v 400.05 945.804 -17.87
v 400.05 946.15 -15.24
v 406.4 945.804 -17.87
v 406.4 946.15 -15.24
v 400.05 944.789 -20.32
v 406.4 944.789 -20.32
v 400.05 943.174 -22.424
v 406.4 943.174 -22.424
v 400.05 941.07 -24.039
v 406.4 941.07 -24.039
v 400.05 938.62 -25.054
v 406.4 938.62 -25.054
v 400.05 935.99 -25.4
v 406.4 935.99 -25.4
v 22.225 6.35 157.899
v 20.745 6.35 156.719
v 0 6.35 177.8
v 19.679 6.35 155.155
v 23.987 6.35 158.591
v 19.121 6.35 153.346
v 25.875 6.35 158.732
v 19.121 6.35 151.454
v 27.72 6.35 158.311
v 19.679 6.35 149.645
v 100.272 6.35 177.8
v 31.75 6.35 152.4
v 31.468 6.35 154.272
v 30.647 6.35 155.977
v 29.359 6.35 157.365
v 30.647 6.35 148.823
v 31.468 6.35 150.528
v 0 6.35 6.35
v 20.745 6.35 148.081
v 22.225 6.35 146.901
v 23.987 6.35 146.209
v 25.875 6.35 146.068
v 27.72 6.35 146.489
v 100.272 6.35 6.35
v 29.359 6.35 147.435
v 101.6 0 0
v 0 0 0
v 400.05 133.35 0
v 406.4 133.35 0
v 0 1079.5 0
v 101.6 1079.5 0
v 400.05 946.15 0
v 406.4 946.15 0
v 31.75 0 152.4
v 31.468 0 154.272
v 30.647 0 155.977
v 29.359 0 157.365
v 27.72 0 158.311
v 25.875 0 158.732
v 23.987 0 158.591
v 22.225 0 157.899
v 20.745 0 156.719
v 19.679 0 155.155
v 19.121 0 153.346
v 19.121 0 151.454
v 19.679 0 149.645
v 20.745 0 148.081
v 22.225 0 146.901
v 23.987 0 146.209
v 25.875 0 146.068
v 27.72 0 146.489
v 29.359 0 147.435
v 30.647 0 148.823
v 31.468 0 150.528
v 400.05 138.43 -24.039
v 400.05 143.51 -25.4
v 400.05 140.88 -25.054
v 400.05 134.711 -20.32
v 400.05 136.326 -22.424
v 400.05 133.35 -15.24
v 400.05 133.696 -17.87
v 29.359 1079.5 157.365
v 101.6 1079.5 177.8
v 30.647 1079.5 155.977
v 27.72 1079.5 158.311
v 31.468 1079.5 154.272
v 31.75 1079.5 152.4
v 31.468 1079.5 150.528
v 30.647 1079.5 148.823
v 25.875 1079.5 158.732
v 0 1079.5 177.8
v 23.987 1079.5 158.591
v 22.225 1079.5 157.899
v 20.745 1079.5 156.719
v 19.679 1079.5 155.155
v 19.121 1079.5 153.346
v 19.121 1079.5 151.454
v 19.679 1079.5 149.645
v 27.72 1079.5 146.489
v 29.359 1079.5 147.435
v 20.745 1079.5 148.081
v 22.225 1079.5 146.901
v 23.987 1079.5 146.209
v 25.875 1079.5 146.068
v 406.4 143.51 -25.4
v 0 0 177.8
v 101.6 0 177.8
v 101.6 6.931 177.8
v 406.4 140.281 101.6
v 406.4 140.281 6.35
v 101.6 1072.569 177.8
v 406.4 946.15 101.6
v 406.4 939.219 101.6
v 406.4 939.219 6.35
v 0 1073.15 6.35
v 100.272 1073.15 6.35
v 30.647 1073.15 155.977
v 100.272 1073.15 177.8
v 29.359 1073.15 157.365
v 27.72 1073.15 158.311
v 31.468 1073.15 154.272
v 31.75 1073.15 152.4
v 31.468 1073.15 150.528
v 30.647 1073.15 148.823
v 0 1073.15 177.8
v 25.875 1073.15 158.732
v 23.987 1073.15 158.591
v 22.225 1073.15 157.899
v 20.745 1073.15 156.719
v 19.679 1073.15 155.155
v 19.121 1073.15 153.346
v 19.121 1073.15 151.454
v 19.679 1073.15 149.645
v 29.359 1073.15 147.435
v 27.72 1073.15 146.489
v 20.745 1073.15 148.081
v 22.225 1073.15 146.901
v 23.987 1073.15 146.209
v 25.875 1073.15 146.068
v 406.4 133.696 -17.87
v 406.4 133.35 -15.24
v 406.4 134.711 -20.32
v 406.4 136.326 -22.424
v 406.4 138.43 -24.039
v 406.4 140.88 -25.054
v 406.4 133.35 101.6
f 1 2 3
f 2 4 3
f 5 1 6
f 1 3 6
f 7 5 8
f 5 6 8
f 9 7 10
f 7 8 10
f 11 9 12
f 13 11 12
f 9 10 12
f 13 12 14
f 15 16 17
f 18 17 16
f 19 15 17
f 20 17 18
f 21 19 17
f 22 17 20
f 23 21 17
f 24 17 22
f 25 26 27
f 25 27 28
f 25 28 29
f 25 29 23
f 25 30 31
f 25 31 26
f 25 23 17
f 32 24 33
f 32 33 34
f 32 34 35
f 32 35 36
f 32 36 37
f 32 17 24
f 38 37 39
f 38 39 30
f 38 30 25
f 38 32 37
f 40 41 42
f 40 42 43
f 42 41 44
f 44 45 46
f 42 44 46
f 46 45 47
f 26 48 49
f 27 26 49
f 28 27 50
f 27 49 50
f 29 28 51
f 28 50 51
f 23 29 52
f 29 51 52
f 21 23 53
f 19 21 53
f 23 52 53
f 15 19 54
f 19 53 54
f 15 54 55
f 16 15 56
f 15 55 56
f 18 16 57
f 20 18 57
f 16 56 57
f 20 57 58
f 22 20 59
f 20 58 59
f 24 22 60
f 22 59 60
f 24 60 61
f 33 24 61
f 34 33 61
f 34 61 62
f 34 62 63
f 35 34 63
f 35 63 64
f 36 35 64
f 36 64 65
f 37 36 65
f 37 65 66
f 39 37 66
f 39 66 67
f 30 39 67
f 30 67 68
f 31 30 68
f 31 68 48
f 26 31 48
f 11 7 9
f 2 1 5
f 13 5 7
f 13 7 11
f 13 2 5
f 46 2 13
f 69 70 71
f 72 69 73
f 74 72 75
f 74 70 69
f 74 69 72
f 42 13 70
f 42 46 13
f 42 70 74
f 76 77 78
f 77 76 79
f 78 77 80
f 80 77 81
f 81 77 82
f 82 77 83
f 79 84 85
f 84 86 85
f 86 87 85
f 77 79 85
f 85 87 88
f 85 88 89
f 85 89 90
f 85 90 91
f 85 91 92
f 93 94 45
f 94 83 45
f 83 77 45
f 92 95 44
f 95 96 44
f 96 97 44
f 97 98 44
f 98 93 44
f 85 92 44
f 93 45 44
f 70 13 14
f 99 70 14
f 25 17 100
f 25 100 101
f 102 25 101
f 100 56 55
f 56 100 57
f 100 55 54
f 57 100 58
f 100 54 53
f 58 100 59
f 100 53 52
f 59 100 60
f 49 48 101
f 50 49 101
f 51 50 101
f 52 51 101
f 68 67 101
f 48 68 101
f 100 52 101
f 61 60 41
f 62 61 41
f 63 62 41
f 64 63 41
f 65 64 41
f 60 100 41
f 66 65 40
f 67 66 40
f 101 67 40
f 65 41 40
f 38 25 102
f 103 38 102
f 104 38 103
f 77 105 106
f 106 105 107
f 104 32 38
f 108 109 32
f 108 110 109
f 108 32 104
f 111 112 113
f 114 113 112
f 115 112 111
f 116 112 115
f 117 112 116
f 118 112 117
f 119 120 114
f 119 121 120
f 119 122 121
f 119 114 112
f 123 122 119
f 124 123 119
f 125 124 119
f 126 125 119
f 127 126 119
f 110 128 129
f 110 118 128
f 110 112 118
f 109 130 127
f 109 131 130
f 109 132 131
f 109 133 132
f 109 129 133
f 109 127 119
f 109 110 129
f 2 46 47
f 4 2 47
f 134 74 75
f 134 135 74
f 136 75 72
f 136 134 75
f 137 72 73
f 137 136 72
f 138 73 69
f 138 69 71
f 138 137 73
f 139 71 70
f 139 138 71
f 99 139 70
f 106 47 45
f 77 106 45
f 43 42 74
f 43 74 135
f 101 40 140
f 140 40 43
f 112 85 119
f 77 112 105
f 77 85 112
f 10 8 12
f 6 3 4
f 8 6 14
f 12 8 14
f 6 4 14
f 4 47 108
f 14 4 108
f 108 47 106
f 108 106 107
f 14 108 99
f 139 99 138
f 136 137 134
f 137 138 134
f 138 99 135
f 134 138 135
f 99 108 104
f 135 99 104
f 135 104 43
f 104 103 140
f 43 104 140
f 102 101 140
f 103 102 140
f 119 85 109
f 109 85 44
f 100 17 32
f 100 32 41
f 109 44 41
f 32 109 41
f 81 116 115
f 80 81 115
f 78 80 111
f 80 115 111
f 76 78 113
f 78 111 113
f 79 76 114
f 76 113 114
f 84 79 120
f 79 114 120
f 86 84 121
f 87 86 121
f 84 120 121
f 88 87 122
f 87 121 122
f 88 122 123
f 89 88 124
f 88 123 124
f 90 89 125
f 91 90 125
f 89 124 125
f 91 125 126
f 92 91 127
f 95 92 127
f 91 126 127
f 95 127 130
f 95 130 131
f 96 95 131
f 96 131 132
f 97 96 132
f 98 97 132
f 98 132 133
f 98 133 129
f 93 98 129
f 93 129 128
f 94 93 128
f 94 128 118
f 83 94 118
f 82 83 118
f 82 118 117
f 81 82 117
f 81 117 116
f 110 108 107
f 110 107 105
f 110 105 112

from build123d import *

# Parameters (mm, degrees)
F1_DEPTH = 177.8
F2_T     = -6.35
F3_R     = 6.35
F4_DEPTH = 1079.501
F5_W     = 6.35
F5_H     = 812.8
F6_DEPTH = 25.4
F8_R     = 10.16
F9_DEPTH = 1079.501


with BuildPart() as f1:
    # F0 (on Top) → F1 (new body)
    with BuildSketch(Plane.XY):
        Polygon((0, 1079.5), (0, 0), (101.6, 0), (406.4, 133.35), (406.4, 539.75), (406.4, 946.15), (101.6, 1079.5), align=None)
    extrude(amount=F1_DEPTH)

    # F2
    f2_openings = [f1.faces().sort_by_distance(p)[0] for p in [
        (192.825932, 539.75, 177.8),
        (0, 539.75, 88.9),
        (406.4, 539.75, 88.9),
    ]]
    offset(amount=F2_T, openings=f2_openings)

    # F3 (on face) → F4 (cut, through all)
    with BuildSketch(Plane.XZ):
        with Locations((25.4, 152.4)):
            Circle(F3_R)
    extrude(amount=-F4_DEPTH, mode=Mode.SUBTRACT)

    # F5 (on face) → F6 (join)
    with BuildSketch(Plane(origin=(0, 0, 0), x_dir=(1, 0, 0), z_dir=(0, 0, -1))):
        with Locations((403.225, -539.75)):
            Rectangle(F5_W, F5_H)
    extrude(amount=F6_DEPTH)

    # F8
    f8_edges = [f1.edges().sort_by_distance(p)[0] for p in [
        (403.225, 133.35, -25.4),
        (403.225, 946.15, -25.4),
    ]]
    fillet(f8_edges, radius=F8_R)

    # F7 (on Front) → F9 (cut, through all)
    with BuildSketch(Plane.XZ):
        Polygon((406.4, 101.6), (406.4, 177.8), (101.6, 177.8), align=None)
    extrude(amount=-F9_DEPTH, mode=Mode.SUBTRACT)


solid = f1.part
